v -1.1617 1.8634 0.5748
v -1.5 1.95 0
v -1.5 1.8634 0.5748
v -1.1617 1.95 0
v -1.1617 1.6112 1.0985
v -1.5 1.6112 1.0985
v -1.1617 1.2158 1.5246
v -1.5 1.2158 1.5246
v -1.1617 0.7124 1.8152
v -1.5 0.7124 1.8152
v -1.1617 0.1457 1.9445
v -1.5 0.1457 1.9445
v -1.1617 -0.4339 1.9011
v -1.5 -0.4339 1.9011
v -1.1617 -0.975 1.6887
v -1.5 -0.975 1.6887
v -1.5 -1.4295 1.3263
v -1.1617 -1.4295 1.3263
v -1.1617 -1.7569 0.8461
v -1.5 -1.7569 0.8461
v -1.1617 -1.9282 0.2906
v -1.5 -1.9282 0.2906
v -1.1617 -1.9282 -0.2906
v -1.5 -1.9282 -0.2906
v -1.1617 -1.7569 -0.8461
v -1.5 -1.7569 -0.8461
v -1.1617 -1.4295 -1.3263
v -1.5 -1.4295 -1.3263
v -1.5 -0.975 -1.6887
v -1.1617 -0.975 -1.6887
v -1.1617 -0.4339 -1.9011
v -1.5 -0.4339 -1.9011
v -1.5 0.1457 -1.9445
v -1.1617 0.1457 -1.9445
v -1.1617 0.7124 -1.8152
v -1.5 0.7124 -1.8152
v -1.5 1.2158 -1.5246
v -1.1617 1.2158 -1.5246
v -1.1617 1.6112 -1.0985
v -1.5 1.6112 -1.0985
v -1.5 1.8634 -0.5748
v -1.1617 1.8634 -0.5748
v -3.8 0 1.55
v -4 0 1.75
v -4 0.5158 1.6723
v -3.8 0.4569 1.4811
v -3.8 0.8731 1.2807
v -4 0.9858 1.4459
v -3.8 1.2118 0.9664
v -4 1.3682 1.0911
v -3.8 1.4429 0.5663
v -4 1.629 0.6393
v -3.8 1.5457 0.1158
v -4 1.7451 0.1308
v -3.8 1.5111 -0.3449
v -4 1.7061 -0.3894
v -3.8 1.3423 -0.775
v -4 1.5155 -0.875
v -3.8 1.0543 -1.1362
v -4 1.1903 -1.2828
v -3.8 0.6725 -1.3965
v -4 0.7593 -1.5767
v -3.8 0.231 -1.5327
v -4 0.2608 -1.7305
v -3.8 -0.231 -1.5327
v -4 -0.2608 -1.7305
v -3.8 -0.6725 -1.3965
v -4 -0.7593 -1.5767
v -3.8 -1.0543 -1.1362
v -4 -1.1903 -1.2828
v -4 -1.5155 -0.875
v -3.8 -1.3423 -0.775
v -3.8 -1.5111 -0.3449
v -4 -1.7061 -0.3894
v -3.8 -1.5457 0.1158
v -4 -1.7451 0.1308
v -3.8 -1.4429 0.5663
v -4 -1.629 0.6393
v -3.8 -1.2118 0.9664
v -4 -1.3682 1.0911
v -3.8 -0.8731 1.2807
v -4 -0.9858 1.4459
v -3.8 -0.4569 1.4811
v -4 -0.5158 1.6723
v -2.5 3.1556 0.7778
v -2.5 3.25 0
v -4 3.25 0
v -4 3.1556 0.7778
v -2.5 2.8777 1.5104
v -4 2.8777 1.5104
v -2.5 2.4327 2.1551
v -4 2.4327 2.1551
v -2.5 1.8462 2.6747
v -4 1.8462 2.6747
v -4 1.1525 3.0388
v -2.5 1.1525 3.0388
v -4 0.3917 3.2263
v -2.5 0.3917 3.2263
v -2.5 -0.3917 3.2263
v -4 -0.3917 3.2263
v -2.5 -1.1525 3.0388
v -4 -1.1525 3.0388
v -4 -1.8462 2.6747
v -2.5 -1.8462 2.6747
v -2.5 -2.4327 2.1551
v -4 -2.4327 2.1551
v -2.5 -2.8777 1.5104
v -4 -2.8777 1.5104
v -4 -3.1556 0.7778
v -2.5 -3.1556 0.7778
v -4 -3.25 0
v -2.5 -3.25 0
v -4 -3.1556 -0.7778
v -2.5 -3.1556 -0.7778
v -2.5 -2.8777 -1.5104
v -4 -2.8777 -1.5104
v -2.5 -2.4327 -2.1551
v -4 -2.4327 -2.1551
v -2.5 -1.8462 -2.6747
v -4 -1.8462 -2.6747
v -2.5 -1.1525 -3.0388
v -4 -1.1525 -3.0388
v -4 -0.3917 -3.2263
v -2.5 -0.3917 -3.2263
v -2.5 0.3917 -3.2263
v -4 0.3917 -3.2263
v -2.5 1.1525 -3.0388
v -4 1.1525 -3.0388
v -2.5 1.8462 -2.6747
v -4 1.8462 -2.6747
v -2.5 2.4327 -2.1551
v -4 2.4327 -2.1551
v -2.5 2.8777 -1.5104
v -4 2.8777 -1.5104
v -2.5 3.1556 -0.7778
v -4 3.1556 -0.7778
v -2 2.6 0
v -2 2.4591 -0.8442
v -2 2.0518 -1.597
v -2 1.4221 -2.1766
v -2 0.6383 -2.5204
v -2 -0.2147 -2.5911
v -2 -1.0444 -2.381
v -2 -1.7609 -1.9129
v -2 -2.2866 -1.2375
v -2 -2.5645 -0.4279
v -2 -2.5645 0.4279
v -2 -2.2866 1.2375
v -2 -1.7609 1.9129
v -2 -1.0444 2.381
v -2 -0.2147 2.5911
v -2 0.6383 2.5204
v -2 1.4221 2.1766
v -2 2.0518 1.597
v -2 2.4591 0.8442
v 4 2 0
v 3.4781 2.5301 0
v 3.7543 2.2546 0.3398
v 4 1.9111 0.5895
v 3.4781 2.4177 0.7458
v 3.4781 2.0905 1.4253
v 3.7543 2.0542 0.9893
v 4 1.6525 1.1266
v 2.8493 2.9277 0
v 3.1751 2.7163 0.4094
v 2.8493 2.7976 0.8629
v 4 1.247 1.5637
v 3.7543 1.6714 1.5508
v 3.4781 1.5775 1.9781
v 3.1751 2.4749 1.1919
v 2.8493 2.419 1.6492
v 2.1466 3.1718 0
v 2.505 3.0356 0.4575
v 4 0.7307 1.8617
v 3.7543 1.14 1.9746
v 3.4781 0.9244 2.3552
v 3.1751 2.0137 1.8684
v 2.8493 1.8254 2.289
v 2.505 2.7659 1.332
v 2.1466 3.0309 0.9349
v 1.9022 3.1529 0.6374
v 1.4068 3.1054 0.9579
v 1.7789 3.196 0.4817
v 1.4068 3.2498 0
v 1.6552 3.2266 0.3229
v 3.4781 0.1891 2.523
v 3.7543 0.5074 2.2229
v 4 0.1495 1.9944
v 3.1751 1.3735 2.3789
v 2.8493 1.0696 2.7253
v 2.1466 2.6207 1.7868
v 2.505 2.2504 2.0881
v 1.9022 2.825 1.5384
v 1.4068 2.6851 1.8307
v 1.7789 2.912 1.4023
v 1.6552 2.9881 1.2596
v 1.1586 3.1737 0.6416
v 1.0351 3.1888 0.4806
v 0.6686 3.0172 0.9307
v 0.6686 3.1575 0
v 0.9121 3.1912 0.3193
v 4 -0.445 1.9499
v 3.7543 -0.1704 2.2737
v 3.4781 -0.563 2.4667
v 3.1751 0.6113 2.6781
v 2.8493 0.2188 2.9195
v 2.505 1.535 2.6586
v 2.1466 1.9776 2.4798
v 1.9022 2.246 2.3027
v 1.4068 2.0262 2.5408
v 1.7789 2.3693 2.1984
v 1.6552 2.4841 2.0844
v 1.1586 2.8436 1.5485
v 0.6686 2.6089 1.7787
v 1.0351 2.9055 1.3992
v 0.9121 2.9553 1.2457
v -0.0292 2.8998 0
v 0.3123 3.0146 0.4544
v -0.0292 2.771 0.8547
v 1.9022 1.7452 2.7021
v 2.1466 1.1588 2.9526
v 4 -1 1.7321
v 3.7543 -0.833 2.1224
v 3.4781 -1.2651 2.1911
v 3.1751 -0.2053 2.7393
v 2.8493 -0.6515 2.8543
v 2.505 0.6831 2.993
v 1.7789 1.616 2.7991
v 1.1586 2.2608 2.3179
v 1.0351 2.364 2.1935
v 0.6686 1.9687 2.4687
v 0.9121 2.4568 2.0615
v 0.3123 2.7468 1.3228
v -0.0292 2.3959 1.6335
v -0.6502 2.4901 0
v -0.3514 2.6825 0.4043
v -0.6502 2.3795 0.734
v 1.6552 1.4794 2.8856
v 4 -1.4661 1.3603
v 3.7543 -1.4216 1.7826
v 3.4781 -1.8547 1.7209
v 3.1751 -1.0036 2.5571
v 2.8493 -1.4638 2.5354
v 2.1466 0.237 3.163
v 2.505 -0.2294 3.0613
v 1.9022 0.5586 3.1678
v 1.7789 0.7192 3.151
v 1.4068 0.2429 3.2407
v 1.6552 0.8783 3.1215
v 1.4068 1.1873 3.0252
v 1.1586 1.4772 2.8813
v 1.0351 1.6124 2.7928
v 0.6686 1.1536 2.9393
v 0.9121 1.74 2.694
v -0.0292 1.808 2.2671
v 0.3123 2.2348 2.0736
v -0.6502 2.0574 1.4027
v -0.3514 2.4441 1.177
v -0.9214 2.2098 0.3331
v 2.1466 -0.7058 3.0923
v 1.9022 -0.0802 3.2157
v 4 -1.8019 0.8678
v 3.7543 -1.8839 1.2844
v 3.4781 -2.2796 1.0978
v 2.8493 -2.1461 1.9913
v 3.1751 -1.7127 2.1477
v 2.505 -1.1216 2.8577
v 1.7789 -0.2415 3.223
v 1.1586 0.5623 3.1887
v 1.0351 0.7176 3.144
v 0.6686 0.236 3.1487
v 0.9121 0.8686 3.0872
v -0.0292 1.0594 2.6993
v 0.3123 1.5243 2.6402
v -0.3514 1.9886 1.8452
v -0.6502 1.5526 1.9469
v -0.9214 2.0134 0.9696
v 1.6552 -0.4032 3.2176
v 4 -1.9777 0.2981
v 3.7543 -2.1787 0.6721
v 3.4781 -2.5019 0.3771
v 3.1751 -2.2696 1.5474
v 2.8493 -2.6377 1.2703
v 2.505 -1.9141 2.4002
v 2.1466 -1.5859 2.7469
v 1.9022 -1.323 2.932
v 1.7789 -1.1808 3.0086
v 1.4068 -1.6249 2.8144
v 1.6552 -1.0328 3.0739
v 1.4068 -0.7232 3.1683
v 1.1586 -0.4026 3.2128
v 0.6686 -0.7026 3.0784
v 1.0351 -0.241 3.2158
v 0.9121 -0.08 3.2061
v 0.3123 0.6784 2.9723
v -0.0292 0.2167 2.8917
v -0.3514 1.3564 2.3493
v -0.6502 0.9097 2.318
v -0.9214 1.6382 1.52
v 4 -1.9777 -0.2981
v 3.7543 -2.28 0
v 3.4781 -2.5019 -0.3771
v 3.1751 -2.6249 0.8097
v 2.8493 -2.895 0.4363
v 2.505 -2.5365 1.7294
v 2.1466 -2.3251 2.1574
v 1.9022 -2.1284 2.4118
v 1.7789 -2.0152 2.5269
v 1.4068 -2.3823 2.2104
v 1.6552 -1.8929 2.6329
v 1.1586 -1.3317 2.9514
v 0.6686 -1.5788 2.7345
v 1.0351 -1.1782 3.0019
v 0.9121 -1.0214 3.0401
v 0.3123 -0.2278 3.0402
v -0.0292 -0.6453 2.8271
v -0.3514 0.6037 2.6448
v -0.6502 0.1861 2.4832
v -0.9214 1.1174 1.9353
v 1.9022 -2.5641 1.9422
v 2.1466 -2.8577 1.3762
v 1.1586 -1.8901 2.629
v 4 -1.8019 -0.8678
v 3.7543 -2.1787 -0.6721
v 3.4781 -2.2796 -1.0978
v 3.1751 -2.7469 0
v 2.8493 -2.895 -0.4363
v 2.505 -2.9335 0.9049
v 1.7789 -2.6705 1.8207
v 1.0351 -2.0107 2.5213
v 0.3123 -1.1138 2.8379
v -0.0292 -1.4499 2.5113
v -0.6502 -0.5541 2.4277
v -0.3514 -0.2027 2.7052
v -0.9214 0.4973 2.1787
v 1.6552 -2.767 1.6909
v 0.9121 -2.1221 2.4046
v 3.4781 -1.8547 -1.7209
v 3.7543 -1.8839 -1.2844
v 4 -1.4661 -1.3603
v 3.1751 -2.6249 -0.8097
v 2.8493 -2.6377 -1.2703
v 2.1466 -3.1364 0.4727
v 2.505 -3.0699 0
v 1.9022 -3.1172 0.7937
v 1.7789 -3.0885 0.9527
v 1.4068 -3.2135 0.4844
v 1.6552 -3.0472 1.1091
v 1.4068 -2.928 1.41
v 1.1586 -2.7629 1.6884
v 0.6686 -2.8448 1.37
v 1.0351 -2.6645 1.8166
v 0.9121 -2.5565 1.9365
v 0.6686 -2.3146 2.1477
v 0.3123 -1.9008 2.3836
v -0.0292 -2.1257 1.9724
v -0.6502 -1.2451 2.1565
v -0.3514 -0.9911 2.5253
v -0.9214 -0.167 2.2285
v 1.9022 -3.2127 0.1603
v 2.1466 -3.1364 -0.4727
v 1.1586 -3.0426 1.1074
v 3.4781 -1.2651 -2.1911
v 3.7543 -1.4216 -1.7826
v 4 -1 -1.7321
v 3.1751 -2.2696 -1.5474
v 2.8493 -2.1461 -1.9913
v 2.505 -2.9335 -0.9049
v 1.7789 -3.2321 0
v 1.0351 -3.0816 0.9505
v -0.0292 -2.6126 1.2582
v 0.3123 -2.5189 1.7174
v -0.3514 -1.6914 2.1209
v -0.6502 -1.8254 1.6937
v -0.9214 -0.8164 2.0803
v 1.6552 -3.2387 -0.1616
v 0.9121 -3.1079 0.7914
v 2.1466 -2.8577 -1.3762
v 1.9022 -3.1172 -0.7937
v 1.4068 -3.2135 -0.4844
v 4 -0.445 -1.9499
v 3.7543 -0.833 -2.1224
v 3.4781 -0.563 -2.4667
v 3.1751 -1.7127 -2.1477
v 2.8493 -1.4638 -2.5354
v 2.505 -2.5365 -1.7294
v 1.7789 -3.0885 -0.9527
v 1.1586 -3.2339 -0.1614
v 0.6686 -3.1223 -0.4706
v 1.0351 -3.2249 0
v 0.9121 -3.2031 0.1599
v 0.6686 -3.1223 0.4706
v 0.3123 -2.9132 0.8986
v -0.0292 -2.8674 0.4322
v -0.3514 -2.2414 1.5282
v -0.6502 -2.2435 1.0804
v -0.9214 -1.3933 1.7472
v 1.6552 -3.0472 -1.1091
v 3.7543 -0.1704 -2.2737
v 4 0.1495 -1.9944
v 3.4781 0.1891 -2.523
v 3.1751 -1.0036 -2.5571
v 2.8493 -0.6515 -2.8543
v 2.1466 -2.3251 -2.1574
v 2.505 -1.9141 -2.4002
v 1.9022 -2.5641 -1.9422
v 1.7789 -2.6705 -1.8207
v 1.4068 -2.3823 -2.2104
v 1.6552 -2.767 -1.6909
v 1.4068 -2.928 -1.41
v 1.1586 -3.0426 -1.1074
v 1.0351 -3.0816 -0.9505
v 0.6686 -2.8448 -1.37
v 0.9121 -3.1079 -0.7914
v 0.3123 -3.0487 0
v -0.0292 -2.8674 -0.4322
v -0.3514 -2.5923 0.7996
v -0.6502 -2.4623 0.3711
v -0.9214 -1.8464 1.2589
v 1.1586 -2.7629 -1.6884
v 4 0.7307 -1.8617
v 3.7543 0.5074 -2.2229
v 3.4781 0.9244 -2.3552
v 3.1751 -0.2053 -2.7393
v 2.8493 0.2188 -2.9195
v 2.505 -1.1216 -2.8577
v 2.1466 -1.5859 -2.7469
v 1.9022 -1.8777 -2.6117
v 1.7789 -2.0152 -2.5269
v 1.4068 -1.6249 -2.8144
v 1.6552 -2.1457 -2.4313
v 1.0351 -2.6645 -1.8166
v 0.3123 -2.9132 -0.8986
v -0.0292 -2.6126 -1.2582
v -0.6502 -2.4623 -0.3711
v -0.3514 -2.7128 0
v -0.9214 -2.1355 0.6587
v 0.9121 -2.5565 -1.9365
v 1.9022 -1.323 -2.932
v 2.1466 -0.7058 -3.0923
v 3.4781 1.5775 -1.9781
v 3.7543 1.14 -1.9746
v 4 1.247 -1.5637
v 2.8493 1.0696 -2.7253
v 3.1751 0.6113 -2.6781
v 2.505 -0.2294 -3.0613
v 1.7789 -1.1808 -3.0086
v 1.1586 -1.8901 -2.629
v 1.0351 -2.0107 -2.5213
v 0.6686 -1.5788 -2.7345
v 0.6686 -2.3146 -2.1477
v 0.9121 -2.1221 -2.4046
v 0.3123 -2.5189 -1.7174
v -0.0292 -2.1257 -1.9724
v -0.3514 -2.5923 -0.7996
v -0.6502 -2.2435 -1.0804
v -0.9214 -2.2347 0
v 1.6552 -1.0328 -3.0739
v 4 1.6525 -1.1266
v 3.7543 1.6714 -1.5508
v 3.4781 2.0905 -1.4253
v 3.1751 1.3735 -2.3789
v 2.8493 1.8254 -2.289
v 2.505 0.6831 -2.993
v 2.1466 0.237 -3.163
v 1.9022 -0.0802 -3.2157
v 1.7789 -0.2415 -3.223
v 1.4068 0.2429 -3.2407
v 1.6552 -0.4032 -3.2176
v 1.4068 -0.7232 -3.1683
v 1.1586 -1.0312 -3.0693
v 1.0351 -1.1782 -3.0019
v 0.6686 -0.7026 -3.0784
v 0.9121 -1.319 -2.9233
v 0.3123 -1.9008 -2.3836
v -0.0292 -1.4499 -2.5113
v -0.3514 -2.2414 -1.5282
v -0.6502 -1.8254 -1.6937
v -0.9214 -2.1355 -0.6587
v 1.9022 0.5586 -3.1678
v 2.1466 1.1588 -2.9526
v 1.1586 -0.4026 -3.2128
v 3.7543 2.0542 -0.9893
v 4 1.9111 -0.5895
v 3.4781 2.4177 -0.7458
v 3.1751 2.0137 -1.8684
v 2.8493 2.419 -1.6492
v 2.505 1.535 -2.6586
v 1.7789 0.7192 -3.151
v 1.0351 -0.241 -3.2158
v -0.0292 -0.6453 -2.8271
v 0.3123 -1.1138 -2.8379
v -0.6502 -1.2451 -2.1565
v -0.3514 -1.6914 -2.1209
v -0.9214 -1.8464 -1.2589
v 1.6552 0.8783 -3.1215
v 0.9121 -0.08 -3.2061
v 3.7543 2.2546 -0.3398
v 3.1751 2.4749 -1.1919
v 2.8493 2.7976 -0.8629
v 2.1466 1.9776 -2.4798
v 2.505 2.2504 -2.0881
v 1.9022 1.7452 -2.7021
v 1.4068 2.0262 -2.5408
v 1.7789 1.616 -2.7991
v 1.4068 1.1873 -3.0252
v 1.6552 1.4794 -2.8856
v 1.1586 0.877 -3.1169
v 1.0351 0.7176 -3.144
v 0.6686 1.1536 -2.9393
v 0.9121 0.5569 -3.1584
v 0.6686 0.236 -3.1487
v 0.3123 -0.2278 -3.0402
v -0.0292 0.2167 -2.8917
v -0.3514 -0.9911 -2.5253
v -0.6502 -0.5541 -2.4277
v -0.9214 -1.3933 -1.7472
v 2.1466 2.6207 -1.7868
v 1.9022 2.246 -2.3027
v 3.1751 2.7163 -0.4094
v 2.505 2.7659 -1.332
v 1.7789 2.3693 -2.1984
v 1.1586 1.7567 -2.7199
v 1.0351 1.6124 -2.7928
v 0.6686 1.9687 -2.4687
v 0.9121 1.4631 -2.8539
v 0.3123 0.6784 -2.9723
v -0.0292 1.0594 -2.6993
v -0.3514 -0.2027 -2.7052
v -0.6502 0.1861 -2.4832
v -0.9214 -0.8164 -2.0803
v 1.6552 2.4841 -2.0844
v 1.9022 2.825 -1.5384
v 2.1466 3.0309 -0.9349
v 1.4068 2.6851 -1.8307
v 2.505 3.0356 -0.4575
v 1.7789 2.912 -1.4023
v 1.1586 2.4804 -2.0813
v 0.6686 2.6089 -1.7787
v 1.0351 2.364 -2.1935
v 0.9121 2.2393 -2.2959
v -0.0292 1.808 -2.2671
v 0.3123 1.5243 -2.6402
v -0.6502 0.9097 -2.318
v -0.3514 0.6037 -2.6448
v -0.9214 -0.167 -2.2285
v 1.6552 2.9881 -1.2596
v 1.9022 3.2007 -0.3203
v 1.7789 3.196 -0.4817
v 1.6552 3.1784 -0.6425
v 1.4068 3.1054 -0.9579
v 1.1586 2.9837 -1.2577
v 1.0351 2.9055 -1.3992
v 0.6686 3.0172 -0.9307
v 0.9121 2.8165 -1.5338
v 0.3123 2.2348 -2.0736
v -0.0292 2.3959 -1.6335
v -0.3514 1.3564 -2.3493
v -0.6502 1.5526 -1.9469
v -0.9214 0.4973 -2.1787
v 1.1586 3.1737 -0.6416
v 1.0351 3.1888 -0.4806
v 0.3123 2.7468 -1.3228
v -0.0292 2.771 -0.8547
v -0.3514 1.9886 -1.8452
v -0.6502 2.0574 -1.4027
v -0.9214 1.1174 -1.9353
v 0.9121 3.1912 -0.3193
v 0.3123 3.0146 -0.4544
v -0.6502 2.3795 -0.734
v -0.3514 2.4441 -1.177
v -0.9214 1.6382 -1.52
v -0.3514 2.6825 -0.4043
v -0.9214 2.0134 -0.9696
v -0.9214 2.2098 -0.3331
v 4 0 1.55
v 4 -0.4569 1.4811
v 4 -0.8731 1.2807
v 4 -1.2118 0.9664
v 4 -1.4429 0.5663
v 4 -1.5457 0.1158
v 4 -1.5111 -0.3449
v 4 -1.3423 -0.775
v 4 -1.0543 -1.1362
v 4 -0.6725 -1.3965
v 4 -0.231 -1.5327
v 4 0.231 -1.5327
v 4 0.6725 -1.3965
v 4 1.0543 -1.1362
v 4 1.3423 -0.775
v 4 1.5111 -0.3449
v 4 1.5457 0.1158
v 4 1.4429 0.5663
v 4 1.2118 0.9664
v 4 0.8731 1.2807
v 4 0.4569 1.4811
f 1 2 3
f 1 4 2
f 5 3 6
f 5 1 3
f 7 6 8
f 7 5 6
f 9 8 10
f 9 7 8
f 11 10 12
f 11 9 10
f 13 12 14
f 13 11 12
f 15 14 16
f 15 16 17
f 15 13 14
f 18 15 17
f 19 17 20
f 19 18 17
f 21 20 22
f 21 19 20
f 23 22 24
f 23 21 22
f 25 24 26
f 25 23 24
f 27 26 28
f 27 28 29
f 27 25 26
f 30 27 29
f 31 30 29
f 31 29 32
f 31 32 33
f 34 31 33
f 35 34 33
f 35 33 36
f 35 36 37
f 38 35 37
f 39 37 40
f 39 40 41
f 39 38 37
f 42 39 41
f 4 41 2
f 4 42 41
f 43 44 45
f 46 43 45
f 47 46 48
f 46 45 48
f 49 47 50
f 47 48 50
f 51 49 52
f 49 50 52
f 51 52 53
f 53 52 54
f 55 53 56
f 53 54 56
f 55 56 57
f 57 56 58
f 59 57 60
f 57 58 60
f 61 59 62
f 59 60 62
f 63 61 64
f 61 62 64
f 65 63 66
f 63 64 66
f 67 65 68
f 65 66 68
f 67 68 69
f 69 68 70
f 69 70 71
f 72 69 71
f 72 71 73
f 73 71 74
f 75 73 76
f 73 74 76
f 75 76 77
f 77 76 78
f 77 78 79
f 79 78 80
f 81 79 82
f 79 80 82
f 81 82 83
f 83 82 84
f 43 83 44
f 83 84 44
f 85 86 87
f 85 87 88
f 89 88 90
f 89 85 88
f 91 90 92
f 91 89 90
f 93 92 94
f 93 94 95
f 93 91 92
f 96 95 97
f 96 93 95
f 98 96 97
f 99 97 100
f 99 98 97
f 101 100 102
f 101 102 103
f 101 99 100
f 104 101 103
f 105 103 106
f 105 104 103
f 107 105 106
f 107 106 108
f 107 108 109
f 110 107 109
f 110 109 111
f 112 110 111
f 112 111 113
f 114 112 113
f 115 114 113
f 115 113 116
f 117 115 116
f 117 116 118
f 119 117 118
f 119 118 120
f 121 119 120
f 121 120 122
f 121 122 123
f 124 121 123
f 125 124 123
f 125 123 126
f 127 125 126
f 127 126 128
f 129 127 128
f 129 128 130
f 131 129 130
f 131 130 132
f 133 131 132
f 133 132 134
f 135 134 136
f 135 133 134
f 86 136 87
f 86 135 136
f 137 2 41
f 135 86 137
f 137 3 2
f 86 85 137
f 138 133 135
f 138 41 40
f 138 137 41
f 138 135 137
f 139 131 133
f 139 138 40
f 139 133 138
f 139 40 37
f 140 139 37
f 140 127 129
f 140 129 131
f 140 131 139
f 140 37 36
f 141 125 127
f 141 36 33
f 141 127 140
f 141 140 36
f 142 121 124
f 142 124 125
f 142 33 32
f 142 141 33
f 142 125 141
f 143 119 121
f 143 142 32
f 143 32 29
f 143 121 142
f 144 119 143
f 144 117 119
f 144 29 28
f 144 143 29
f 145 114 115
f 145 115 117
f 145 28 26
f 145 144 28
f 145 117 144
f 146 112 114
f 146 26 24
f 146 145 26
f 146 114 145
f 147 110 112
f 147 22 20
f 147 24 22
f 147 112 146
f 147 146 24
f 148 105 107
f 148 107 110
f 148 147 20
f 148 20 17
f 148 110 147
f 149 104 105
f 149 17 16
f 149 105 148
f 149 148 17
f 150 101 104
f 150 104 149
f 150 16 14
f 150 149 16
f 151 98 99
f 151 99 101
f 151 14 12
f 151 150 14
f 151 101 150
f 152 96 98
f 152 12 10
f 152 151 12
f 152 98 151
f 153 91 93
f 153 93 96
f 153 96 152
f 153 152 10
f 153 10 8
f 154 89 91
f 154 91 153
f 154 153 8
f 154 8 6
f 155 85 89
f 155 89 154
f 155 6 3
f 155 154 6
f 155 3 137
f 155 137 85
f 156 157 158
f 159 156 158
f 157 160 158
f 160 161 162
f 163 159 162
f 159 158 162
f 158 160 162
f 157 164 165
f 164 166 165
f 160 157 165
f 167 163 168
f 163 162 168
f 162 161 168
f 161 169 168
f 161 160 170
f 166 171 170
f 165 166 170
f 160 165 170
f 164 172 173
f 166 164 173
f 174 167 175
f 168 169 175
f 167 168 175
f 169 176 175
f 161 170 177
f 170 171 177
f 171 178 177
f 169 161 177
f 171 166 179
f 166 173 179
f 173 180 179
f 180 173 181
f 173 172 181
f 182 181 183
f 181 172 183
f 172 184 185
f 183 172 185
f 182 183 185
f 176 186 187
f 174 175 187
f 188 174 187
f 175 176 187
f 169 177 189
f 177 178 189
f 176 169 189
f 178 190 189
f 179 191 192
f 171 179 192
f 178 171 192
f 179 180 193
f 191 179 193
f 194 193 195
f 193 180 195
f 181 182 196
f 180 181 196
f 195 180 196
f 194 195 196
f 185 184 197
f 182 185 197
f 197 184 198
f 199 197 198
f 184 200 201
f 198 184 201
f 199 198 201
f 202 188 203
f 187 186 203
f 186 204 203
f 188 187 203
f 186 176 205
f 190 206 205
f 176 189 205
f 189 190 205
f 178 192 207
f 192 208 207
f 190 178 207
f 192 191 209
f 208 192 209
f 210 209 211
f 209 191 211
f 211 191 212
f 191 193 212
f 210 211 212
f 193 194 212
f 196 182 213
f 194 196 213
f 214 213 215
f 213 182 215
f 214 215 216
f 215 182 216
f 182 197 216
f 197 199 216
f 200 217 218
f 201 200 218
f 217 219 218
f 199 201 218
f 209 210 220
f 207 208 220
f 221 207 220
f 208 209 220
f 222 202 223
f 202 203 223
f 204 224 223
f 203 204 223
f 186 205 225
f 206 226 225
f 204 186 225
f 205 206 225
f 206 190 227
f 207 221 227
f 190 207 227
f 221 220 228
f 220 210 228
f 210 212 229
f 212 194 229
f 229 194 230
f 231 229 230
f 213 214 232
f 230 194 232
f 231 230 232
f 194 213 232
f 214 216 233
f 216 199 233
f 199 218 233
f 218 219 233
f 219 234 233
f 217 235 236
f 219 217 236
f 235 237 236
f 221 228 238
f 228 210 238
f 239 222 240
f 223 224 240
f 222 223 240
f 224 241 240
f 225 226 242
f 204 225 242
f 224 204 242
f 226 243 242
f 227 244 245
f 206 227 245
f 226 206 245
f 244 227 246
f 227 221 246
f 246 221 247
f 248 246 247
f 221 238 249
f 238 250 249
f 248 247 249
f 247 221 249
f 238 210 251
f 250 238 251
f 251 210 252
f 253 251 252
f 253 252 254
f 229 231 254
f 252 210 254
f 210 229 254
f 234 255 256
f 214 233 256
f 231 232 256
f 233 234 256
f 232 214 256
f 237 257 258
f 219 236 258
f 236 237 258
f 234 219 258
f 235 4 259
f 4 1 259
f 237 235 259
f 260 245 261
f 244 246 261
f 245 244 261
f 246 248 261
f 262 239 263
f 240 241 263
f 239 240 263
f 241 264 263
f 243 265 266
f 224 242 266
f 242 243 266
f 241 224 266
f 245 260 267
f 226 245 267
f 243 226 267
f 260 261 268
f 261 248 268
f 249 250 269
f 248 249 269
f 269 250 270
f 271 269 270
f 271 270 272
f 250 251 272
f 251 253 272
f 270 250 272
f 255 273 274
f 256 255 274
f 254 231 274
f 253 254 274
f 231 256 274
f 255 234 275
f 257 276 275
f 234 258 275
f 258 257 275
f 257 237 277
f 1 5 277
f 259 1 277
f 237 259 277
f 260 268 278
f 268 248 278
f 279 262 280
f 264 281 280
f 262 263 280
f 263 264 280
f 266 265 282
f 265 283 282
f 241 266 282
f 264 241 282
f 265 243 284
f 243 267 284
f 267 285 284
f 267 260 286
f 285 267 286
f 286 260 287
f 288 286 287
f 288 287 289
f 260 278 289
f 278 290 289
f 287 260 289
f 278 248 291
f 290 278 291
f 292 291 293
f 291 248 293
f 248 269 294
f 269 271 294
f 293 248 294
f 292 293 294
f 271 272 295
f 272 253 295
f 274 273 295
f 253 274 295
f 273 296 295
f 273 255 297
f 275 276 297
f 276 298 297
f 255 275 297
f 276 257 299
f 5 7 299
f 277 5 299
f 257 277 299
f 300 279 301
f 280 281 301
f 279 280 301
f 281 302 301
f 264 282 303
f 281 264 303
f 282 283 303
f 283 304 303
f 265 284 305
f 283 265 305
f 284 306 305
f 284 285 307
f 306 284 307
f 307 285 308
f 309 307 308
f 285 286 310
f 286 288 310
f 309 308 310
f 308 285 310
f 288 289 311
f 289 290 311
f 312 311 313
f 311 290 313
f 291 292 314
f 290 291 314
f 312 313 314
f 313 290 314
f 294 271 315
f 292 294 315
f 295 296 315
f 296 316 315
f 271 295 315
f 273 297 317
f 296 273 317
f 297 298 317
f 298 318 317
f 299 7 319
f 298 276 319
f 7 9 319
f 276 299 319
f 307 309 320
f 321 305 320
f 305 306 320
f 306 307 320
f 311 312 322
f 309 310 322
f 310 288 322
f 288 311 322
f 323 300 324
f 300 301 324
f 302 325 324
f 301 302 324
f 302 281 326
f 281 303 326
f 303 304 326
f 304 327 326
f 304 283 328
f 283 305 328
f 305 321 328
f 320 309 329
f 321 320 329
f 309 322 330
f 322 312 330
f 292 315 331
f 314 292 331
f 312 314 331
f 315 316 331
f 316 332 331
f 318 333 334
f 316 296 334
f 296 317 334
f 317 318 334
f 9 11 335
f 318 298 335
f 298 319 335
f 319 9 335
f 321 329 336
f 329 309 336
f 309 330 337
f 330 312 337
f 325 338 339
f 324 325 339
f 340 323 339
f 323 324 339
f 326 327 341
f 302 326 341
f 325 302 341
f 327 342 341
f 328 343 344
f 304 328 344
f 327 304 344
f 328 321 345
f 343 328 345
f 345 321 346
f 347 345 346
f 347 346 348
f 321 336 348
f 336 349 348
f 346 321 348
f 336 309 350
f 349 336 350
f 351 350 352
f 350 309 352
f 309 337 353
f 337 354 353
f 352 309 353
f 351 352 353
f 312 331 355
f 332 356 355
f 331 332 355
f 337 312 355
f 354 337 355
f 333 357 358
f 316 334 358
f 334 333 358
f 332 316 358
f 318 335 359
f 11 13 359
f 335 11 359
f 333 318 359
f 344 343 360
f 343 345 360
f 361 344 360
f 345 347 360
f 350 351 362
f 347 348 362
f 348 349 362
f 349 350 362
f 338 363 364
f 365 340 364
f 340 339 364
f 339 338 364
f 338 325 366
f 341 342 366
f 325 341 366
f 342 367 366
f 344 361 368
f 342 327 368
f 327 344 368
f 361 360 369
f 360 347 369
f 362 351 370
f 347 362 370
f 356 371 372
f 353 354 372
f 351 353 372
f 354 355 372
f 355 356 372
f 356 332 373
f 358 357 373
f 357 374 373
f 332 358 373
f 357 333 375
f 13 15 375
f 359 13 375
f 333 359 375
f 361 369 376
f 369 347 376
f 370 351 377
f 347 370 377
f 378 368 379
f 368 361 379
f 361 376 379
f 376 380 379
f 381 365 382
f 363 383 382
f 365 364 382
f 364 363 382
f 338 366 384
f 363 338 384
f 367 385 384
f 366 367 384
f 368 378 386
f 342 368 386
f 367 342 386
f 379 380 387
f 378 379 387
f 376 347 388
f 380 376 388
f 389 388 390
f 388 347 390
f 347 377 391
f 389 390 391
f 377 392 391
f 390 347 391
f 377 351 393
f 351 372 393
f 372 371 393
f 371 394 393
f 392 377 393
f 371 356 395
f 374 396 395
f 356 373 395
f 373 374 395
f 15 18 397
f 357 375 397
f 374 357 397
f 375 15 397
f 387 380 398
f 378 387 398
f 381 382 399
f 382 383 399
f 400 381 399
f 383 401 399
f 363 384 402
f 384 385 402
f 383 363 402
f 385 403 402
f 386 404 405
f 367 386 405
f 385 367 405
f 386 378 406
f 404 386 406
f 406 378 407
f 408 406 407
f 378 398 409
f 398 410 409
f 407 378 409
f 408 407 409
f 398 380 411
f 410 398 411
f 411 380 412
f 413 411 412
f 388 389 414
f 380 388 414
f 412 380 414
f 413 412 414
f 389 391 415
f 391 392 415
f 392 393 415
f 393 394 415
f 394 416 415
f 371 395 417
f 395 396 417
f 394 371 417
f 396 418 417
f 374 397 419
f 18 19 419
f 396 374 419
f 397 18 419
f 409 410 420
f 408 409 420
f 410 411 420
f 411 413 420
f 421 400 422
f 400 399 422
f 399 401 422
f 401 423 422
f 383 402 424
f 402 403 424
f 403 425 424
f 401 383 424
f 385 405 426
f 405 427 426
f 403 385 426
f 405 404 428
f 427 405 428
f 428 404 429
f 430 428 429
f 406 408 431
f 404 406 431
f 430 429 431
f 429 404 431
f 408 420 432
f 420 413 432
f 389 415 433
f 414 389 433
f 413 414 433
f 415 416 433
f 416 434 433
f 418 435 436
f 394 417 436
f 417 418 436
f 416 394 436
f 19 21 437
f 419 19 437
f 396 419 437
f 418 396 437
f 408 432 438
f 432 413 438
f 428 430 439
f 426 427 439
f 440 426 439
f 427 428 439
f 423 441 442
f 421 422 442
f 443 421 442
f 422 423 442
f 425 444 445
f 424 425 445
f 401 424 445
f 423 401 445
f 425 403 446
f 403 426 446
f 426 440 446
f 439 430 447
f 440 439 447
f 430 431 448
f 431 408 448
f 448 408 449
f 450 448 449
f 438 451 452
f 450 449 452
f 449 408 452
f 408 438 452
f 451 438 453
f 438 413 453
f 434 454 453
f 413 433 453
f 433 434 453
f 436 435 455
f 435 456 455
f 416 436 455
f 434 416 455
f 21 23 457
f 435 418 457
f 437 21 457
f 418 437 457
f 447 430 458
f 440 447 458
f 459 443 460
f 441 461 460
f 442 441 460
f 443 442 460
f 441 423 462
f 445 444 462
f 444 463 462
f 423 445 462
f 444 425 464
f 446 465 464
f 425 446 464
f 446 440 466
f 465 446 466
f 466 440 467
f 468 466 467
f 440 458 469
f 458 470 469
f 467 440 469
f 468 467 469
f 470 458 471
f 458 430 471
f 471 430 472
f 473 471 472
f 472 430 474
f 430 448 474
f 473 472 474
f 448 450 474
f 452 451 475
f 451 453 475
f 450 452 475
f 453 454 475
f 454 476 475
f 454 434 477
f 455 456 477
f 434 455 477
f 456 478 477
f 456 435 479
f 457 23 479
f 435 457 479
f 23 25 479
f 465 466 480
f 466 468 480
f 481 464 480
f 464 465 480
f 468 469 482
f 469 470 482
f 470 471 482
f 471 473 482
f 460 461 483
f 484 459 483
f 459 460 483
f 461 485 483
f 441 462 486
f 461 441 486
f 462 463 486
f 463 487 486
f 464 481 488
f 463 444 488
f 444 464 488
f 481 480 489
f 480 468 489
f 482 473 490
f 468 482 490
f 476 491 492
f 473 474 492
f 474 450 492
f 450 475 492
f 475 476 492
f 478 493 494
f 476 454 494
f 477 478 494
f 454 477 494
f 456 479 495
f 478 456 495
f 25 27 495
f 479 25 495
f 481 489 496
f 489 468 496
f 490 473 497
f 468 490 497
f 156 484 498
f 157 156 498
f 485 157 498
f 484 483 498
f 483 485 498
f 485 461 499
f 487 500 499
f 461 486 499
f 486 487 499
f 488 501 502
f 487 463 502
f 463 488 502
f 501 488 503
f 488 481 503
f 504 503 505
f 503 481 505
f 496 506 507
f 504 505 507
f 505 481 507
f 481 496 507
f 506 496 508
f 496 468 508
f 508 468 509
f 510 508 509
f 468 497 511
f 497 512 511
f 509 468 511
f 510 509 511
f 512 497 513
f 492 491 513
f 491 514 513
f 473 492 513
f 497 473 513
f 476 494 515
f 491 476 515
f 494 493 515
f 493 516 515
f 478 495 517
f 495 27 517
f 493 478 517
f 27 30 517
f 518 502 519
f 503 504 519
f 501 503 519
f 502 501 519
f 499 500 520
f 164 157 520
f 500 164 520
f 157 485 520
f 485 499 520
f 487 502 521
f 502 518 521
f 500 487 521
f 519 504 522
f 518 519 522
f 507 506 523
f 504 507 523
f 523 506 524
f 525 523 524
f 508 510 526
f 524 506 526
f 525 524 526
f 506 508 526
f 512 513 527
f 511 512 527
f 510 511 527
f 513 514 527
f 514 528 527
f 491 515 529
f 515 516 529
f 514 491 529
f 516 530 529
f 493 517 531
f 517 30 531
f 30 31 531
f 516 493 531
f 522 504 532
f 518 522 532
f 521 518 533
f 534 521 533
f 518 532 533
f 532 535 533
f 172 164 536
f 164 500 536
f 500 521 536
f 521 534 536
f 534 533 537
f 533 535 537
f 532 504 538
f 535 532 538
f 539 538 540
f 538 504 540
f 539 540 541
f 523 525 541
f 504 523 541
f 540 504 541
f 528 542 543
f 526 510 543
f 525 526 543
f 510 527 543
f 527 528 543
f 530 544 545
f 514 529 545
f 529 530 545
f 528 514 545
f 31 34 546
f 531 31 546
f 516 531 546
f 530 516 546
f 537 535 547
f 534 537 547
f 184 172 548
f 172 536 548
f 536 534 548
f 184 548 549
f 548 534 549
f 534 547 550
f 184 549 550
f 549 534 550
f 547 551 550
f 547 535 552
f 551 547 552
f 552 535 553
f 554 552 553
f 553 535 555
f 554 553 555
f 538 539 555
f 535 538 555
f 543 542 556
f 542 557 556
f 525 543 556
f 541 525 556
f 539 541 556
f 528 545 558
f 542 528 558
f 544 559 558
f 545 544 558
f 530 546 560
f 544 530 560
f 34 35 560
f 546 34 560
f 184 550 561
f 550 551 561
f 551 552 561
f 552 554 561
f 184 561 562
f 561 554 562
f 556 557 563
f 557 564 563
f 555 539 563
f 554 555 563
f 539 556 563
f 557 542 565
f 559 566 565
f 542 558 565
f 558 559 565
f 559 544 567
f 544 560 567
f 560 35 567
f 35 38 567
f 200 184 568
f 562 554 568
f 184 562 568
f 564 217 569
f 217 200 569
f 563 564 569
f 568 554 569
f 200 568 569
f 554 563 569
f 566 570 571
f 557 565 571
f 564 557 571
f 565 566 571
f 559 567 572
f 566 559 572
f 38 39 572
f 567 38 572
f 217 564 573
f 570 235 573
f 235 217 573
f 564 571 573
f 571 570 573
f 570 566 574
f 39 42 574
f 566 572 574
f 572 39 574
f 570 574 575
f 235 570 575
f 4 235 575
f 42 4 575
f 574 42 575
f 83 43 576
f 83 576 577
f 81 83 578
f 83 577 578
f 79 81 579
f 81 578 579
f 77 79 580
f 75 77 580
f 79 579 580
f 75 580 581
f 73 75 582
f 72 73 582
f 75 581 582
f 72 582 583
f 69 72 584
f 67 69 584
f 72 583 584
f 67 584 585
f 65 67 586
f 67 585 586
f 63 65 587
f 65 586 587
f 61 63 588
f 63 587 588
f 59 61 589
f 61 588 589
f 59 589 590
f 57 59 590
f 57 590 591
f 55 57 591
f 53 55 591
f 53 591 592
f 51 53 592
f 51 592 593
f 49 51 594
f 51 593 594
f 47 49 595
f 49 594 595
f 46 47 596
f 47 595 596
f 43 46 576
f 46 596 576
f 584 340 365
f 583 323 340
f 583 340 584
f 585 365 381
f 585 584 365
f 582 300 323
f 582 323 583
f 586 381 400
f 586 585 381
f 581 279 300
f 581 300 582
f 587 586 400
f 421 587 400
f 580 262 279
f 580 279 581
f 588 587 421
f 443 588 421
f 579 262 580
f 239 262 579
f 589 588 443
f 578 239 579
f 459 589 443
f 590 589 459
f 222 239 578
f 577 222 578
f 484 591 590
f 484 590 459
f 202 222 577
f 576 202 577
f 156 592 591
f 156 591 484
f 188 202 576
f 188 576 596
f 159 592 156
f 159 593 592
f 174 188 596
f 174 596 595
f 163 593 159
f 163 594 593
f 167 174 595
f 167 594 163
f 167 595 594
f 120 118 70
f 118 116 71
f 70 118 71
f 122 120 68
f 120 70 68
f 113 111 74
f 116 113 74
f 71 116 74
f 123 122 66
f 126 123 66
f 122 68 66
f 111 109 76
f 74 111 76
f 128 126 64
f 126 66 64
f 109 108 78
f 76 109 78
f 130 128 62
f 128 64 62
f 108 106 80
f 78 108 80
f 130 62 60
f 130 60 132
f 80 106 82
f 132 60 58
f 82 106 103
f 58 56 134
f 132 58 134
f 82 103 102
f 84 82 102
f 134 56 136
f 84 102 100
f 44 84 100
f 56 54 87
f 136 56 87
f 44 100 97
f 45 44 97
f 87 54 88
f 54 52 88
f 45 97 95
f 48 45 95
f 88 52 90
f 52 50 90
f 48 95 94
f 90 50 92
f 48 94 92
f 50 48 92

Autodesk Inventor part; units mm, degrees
ref_plane "YZ Plane" through (0, 0, 0) normal (1, 0, 0) x (0, 1, 0)
ref_plane "XZ Plane" through (0, 0, 0) normal (0, 1, 0) x (-1, 0, 0)
ref_plane "XY Plane" through (0, 0, 0) normal (0, 0, 1) x (1, 0, 0)
sketch "Esquisse1" plane through (0, 0, 0) normal (0, 0, 1) x (1, 0, 0)
  line L0 (-7.1186, 0) -> (5.8768, 0)
  line L1 (-4, 0) -> (-4, 3.25)
  line L2 (-4, 3.25) -> (-2.5, 3.25)
  line L3 (-2.5, 3.25) -> (-1.5, 1.95)
  line L4 (-1.5, 1.95) -> (-1.1617, 1.95)
  arc A0 (4, 2) -> (-1.1617, 1.95) centre (1.4383, 0) ccw
  line L5 (4, 2) -> (4, 0)
  line L6 (-4, 0) -> (4, 0)
  point P0 (0, 0)
  dimension "d1" = 6.5
  dimension "d2" = 8
  dimension "d3" = 1.5
  dimension "d5" = 2.5
  dimension "d6" = 4
  dimension "d7" = 6.5
  dimension "d8" = 4
  dimension "d9" = 3.9
revolve "Révolution1" add sketch "Esquisse1" angle 360 about axis through (-7.1186, 0, 0) along (1, 0, 0)
sketch "Esquisse2" plane through (-4, 0, 0) normal (-1, 0, 0) x (0, 0, 1)
  point P0 (0, 0)
  point P1 (0, 0)
hole "Perçage1" at (-4, 0, 0) direction (1, 0, 0) diameter 3.1 end through all countersink diameter 3.5 countersink angle 90
equation "\"d8\" = 0.5 * d2"
properties part number "Rotule avec meplat" material "Laiton, jaune doux"
